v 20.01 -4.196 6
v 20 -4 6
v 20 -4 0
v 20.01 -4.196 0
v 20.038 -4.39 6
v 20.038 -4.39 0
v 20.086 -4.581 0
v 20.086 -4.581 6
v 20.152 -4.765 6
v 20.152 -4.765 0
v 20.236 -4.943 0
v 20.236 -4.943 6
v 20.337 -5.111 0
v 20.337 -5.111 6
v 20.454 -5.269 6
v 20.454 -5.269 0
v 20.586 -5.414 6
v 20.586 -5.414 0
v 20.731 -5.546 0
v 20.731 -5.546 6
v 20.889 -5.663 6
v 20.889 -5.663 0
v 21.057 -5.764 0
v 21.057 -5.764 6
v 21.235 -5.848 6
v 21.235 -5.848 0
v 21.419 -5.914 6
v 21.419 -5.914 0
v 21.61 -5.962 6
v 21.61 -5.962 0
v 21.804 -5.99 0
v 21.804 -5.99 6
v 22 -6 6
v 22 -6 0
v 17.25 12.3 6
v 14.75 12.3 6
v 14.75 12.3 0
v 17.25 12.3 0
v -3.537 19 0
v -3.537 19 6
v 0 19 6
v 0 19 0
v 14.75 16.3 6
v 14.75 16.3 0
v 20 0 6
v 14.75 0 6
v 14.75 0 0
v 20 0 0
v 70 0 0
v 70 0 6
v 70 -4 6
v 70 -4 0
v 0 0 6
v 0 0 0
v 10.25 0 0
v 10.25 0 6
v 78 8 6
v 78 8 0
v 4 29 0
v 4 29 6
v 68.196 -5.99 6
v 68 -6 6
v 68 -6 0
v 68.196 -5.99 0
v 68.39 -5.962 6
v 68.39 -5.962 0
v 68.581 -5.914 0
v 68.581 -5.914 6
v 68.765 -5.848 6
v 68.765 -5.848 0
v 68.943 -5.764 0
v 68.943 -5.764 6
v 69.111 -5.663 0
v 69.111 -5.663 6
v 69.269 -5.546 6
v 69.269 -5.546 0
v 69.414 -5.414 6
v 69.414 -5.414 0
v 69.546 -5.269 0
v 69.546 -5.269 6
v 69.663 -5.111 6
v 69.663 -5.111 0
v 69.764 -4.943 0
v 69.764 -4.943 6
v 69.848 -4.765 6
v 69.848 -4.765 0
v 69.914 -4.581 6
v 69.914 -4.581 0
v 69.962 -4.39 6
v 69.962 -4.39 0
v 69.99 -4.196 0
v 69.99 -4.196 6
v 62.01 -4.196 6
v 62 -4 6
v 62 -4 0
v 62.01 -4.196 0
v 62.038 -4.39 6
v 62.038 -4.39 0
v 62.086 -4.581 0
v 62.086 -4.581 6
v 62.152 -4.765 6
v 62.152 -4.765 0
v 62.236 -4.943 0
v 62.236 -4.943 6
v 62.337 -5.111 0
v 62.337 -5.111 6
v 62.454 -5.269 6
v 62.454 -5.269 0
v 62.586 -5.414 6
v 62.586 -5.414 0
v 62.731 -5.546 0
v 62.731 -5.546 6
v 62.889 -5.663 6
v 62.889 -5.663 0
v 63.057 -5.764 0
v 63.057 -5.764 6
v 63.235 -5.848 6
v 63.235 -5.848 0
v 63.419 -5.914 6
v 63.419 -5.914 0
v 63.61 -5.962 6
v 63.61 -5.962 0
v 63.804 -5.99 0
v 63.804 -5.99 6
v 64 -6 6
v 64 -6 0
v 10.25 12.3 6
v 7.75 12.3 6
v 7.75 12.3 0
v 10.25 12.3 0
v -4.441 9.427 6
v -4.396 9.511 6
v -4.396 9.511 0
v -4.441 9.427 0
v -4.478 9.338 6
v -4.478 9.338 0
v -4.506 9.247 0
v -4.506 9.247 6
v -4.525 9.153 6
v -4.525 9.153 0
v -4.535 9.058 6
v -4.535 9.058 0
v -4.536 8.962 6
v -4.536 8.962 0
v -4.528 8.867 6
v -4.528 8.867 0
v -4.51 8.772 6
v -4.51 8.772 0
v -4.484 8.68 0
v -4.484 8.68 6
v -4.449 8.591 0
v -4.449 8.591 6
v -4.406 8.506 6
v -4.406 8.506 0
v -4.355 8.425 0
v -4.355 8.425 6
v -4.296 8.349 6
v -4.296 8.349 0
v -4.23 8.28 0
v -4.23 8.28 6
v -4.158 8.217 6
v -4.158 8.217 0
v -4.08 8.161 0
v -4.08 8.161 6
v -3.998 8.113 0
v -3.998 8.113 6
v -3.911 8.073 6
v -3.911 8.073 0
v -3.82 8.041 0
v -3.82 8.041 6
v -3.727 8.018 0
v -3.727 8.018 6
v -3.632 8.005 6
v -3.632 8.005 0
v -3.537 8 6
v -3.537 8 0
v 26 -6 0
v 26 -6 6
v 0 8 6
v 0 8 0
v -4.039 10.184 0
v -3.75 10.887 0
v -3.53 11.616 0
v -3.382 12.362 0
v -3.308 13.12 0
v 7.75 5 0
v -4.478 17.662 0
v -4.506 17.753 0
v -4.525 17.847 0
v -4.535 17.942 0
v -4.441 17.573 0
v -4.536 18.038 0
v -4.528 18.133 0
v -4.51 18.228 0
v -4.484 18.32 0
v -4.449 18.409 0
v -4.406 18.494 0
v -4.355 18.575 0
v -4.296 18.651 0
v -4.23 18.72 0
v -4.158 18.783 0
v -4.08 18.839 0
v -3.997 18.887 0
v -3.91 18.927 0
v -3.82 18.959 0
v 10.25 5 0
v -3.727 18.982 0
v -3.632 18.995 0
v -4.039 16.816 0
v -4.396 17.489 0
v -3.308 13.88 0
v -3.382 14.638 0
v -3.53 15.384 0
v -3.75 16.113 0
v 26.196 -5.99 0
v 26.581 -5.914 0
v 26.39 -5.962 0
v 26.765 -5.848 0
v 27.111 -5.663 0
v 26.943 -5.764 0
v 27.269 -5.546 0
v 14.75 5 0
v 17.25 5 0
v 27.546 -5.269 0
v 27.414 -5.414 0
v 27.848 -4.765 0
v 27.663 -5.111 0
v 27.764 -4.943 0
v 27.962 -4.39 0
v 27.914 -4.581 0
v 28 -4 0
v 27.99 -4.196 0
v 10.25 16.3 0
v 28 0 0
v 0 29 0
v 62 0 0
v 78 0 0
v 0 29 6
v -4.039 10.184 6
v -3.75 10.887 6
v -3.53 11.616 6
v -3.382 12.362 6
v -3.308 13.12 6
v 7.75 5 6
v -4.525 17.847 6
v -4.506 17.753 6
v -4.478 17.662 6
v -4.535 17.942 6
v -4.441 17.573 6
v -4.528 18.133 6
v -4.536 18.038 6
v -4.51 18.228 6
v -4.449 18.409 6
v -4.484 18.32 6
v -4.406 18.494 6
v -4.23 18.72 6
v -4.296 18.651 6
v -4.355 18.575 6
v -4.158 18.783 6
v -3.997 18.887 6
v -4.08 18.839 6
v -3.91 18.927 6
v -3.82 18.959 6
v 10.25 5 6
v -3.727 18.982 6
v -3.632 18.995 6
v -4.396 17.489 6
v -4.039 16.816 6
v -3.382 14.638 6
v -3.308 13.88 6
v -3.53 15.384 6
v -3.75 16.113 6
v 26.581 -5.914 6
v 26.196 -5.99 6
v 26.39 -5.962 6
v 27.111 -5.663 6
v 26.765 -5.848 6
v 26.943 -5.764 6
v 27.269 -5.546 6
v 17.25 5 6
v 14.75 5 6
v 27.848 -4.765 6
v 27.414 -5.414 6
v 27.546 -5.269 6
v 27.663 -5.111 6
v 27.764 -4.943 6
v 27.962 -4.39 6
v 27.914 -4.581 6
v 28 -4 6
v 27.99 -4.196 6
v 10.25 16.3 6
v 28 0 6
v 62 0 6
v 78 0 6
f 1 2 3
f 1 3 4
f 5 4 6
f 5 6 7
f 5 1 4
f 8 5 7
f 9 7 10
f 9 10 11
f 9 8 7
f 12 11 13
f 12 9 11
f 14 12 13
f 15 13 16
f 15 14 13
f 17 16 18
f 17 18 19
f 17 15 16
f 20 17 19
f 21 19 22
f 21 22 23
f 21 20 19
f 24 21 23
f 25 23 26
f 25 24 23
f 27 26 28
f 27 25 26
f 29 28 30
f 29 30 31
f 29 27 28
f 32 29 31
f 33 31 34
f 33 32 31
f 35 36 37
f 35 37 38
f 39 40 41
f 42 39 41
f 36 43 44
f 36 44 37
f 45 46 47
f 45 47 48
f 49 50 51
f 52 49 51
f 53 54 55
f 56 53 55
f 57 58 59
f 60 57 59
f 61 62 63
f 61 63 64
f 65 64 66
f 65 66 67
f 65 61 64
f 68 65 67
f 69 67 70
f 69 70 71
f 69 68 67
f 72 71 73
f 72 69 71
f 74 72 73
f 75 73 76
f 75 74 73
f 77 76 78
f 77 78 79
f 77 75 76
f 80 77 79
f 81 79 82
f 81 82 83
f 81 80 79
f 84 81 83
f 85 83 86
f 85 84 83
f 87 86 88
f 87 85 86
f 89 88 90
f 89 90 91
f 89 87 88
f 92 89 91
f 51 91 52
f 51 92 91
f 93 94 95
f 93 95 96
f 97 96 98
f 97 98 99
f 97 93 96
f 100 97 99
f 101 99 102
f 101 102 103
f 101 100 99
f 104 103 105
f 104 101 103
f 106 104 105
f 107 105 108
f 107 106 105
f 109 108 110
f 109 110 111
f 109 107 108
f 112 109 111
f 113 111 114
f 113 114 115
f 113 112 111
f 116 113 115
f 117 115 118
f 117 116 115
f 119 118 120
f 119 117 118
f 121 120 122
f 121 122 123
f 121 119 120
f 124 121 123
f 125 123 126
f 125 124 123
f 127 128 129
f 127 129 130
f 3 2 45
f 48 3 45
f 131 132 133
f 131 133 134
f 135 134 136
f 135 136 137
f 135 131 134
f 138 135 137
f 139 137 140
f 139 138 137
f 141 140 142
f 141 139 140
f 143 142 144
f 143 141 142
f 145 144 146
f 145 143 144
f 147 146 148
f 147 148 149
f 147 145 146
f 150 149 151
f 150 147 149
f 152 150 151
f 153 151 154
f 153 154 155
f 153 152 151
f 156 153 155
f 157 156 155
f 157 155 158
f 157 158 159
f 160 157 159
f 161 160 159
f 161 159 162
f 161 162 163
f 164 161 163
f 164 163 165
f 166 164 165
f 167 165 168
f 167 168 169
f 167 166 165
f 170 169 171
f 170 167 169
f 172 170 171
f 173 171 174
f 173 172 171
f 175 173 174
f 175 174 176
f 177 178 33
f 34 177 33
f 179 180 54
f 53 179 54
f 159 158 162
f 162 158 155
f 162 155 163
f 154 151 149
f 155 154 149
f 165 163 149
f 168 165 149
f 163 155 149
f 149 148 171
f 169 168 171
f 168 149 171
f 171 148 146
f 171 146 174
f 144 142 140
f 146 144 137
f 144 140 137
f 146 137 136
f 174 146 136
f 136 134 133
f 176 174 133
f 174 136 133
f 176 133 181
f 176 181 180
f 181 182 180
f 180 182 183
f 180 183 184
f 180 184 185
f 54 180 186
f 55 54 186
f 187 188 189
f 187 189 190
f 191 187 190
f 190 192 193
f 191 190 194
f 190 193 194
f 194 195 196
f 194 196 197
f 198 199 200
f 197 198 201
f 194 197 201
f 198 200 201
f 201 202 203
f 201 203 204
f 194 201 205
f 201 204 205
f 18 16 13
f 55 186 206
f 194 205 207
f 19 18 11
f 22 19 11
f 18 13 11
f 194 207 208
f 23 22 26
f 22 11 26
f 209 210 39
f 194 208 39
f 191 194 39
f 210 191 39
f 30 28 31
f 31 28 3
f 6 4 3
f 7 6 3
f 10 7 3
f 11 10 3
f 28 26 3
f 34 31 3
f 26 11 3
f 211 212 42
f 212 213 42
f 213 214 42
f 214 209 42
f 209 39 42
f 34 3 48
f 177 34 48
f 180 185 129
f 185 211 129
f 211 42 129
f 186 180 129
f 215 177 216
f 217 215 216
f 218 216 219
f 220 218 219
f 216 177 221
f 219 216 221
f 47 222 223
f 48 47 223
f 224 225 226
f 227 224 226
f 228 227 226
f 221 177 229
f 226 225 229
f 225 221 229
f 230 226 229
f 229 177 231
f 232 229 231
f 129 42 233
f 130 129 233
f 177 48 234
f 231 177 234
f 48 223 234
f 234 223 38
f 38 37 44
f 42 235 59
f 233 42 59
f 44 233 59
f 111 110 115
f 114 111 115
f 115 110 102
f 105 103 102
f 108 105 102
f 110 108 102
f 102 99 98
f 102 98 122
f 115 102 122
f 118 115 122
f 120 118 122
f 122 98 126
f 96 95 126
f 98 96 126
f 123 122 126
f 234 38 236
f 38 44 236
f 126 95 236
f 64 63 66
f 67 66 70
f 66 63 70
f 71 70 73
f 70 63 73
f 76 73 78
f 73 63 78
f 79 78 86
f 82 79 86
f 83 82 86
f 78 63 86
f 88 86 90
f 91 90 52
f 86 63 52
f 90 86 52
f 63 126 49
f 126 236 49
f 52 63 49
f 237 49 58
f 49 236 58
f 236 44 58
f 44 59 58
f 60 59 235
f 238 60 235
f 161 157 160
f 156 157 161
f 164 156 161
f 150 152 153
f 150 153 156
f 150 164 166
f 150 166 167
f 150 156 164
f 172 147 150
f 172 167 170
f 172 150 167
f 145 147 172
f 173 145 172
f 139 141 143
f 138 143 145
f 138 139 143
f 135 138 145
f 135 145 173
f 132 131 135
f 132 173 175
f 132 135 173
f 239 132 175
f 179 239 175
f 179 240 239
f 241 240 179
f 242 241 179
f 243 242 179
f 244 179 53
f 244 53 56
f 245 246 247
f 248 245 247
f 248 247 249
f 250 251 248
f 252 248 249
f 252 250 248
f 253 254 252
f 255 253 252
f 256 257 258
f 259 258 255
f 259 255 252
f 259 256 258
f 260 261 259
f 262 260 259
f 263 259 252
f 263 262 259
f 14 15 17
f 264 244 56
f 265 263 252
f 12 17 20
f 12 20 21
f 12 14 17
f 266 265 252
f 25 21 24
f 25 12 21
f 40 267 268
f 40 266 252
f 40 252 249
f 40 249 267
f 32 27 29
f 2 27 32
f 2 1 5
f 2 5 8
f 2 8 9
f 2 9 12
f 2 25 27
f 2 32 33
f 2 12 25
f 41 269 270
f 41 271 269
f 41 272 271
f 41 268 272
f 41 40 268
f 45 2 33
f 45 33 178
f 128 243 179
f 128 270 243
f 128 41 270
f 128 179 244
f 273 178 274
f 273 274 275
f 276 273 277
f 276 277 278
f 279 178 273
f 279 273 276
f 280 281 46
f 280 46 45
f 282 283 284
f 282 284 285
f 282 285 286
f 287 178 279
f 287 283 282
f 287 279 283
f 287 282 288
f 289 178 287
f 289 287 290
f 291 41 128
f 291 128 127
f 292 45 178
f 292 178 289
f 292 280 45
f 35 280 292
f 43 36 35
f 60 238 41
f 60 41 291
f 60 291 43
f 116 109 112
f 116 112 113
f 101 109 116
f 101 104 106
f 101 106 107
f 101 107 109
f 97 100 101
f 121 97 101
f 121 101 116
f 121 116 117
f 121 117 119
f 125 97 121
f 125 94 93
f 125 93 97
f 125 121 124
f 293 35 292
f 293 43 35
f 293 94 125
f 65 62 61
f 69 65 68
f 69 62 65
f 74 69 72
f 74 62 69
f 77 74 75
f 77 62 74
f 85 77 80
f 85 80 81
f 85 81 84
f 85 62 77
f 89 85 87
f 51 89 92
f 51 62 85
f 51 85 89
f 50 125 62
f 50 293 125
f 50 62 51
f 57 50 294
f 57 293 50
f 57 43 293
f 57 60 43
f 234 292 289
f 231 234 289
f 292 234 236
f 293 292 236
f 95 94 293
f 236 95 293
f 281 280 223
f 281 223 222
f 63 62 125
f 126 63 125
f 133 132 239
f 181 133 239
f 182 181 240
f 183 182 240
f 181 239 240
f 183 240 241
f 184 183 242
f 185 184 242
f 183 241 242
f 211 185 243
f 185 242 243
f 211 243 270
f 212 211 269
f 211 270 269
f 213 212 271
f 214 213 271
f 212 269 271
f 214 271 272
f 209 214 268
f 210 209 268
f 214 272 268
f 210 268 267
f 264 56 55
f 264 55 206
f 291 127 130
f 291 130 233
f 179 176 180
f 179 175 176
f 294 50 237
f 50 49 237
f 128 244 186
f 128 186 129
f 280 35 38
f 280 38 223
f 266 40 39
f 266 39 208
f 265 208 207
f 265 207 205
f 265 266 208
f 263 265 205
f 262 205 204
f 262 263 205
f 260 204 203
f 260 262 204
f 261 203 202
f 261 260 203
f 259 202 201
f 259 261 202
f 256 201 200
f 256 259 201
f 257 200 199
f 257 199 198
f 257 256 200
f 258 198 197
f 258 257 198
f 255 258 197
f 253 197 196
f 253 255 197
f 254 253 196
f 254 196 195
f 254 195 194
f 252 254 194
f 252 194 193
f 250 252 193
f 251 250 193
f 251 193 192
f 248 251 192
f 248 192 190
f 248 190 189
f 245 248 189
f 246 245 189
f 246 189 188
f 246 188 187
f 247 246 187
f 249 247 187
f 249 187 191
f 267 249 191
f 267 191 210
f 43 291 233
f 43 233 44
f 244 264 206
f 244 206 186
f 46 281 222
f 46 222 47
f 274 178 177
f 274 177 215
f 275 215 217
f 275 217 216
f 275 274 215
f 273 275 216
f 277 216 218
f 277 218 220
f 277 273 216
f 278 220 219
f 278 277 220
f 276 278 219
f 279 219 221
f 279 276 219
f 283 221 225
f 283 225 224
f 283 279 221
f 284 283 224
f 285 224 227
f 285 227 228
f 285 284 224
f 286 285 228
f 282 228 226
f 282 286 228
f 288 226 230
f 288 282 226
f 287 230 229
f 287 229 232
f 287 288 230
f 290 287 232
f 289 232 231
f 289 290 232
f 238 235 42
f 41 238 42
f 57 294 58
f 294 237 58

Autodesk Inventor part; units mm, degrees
ref_plane "YZ Plane" through (0, 0, 0) normal (1, 0, 0) x (0, 1, 0)
ref_plane "XZ Plane" through (0, 0, 0) normal (0, 1, 0) x (-1, 0, 0)
ref_plane "XY Plane" through (0, 0, 0) normal (0, 0, 1) x (1, 0, 0)
sketch "Sketch1" plane through (0, 0, 0) normal (0, 0, 1) x (1, 0, 0)
  line L0 (0, 29) -> (0, 0)
  line L1 (0, 0) -> (78, 0)
  line L2 (78, 0) -> (78, 8)
  line L3 (78, 8) -> (4, 29)
  line L4 (4, 29) -> (0, 29)
  dimension "d0" = 29
  dimension "d1" = 78
  dimension "d2" = 4
  dimension "d3" = 8
extrude "Extrusion1" add sketch "Sketch1" along normal blind 6
sketch "Sketch2" plane through (0, 0, 6) normal (0, 0, 1) x (1, 0, 0)
  line L0 (0, 29) -> (0, 0) projected
  line L1 (0, 0) -> (78, 0) projected
  line L2 (78, 0) -> (78, 8) projected
  line L3 (4, 29) -> (0, 29) projected
  circle A0 centre (-11.099, 13.5) radius 7.5 construction
  line L4 (-6, 19) -> (-6, 8) construction
  arc A1 (-4.396, 9.5114) -> (-4.396, 17.4886) centre (-11.099, 13.5) ccw
  line L5 (-3.5366, 19) -> (0, 19)
  line L6 (-3.5366, 8) -> (0, 8)
  arc A2 (-3.5366, 19) -> (-4.396, 17.4886) centre (-3.5366, 18) ccw
  arc A3 (-4.396, 9.5114) -> (-3.5366, 8) centre (-3.5366, 9) ccw
  line L7 (20, 0) -> (28, 0)
  line L8 (28, 0) -> (28, -4)
  line L9 (26, -6) -> (22, -6)
  line L10 (20, -4) -> (20, 0)
  line L11 (62, 0) -> (70, 0)
  line L12 (70, 0) -> (70, -4)
  line L13 (68, -6) -> (64, -6)
  line L14 (62, -4) -> (62, 0)
  arc A4 (20, -4) -> (22, -6) centre (22, -4) ccw
  arc A5 (26, -6) -> (28, -4) centre (26, -4) ccw
  arc A6 (62, -4) -> (64, -6) centre (64, -4) ccw
  arc A7 (68, -6) -> (70, -4) centre (68, -4) ccw
  point P0 (-5.5682, 19)
  point P1 (-5.5682, 8)
  dimension "d6" = 15
  dimension "d7" = 11
  dimension "d8" = 6
  dimension "d9" = 11
  dimension "d10" = 7.8
  dimension "d11" = 10
  dimension "d12" = 1
  dimension "d13" = 2
  dimension "d15" = 8
  dimension "d17" = 8
  dimension "d18" = 6
  dimension "d19" = 20
  dimension "d20" = 8
extrude "Extrusion2" add sketch "Sketch2" against normal blind 6
sketch "Sketch3" plane through (0, 0, 6) normal (0, 0, 1) x (1, 0, 0)
  line L0 (0, 0) -> (20, 0) projected
  line L1 (20, 0) -> (20, -4) projected
  line L2 (10.25, 16.3) -> (14.75, 16.3)
  line L3 (14.75, 0) -> (10.25, 0)
  line L4 (17.25, 12.3) -> (17.25, 5)
  line L5 (7.75, 5) -> (7.75, 12.3)
  line L6 (7.75, 12.3) -> (10.25, 12.3)
  line L7 (14.75, 12.3) -> (17.25, 12.3)
  line L8 (17.25, 5) -> (14.75, 5)
  line L9 (10.25, 5) -> (7.75, 5)
  line L10 (10.25, 0) -> (10.25, 5)
  line L11 (10.25, 12.3) -> (10.25, 16.3)
  line L12 (14.75, 16.3) -> (14.75, 12.3)
  line L13 (14.75, 5) -> (14.75, 0)
  point P0 (12.5, 16.3)
  dimension "d23" = 4.5
  dimension "d24" = 2.5
  dimension "d25" = 2.5
  dimension "d26" = 4
  dimension "d27" = 5
  dimension "d28" = 7.3
  dimension "d29" = 7.5
extrude "Extrusion3" cut sketch "Sketch3" against normal through all
properties part number "x_carryage_brace"
